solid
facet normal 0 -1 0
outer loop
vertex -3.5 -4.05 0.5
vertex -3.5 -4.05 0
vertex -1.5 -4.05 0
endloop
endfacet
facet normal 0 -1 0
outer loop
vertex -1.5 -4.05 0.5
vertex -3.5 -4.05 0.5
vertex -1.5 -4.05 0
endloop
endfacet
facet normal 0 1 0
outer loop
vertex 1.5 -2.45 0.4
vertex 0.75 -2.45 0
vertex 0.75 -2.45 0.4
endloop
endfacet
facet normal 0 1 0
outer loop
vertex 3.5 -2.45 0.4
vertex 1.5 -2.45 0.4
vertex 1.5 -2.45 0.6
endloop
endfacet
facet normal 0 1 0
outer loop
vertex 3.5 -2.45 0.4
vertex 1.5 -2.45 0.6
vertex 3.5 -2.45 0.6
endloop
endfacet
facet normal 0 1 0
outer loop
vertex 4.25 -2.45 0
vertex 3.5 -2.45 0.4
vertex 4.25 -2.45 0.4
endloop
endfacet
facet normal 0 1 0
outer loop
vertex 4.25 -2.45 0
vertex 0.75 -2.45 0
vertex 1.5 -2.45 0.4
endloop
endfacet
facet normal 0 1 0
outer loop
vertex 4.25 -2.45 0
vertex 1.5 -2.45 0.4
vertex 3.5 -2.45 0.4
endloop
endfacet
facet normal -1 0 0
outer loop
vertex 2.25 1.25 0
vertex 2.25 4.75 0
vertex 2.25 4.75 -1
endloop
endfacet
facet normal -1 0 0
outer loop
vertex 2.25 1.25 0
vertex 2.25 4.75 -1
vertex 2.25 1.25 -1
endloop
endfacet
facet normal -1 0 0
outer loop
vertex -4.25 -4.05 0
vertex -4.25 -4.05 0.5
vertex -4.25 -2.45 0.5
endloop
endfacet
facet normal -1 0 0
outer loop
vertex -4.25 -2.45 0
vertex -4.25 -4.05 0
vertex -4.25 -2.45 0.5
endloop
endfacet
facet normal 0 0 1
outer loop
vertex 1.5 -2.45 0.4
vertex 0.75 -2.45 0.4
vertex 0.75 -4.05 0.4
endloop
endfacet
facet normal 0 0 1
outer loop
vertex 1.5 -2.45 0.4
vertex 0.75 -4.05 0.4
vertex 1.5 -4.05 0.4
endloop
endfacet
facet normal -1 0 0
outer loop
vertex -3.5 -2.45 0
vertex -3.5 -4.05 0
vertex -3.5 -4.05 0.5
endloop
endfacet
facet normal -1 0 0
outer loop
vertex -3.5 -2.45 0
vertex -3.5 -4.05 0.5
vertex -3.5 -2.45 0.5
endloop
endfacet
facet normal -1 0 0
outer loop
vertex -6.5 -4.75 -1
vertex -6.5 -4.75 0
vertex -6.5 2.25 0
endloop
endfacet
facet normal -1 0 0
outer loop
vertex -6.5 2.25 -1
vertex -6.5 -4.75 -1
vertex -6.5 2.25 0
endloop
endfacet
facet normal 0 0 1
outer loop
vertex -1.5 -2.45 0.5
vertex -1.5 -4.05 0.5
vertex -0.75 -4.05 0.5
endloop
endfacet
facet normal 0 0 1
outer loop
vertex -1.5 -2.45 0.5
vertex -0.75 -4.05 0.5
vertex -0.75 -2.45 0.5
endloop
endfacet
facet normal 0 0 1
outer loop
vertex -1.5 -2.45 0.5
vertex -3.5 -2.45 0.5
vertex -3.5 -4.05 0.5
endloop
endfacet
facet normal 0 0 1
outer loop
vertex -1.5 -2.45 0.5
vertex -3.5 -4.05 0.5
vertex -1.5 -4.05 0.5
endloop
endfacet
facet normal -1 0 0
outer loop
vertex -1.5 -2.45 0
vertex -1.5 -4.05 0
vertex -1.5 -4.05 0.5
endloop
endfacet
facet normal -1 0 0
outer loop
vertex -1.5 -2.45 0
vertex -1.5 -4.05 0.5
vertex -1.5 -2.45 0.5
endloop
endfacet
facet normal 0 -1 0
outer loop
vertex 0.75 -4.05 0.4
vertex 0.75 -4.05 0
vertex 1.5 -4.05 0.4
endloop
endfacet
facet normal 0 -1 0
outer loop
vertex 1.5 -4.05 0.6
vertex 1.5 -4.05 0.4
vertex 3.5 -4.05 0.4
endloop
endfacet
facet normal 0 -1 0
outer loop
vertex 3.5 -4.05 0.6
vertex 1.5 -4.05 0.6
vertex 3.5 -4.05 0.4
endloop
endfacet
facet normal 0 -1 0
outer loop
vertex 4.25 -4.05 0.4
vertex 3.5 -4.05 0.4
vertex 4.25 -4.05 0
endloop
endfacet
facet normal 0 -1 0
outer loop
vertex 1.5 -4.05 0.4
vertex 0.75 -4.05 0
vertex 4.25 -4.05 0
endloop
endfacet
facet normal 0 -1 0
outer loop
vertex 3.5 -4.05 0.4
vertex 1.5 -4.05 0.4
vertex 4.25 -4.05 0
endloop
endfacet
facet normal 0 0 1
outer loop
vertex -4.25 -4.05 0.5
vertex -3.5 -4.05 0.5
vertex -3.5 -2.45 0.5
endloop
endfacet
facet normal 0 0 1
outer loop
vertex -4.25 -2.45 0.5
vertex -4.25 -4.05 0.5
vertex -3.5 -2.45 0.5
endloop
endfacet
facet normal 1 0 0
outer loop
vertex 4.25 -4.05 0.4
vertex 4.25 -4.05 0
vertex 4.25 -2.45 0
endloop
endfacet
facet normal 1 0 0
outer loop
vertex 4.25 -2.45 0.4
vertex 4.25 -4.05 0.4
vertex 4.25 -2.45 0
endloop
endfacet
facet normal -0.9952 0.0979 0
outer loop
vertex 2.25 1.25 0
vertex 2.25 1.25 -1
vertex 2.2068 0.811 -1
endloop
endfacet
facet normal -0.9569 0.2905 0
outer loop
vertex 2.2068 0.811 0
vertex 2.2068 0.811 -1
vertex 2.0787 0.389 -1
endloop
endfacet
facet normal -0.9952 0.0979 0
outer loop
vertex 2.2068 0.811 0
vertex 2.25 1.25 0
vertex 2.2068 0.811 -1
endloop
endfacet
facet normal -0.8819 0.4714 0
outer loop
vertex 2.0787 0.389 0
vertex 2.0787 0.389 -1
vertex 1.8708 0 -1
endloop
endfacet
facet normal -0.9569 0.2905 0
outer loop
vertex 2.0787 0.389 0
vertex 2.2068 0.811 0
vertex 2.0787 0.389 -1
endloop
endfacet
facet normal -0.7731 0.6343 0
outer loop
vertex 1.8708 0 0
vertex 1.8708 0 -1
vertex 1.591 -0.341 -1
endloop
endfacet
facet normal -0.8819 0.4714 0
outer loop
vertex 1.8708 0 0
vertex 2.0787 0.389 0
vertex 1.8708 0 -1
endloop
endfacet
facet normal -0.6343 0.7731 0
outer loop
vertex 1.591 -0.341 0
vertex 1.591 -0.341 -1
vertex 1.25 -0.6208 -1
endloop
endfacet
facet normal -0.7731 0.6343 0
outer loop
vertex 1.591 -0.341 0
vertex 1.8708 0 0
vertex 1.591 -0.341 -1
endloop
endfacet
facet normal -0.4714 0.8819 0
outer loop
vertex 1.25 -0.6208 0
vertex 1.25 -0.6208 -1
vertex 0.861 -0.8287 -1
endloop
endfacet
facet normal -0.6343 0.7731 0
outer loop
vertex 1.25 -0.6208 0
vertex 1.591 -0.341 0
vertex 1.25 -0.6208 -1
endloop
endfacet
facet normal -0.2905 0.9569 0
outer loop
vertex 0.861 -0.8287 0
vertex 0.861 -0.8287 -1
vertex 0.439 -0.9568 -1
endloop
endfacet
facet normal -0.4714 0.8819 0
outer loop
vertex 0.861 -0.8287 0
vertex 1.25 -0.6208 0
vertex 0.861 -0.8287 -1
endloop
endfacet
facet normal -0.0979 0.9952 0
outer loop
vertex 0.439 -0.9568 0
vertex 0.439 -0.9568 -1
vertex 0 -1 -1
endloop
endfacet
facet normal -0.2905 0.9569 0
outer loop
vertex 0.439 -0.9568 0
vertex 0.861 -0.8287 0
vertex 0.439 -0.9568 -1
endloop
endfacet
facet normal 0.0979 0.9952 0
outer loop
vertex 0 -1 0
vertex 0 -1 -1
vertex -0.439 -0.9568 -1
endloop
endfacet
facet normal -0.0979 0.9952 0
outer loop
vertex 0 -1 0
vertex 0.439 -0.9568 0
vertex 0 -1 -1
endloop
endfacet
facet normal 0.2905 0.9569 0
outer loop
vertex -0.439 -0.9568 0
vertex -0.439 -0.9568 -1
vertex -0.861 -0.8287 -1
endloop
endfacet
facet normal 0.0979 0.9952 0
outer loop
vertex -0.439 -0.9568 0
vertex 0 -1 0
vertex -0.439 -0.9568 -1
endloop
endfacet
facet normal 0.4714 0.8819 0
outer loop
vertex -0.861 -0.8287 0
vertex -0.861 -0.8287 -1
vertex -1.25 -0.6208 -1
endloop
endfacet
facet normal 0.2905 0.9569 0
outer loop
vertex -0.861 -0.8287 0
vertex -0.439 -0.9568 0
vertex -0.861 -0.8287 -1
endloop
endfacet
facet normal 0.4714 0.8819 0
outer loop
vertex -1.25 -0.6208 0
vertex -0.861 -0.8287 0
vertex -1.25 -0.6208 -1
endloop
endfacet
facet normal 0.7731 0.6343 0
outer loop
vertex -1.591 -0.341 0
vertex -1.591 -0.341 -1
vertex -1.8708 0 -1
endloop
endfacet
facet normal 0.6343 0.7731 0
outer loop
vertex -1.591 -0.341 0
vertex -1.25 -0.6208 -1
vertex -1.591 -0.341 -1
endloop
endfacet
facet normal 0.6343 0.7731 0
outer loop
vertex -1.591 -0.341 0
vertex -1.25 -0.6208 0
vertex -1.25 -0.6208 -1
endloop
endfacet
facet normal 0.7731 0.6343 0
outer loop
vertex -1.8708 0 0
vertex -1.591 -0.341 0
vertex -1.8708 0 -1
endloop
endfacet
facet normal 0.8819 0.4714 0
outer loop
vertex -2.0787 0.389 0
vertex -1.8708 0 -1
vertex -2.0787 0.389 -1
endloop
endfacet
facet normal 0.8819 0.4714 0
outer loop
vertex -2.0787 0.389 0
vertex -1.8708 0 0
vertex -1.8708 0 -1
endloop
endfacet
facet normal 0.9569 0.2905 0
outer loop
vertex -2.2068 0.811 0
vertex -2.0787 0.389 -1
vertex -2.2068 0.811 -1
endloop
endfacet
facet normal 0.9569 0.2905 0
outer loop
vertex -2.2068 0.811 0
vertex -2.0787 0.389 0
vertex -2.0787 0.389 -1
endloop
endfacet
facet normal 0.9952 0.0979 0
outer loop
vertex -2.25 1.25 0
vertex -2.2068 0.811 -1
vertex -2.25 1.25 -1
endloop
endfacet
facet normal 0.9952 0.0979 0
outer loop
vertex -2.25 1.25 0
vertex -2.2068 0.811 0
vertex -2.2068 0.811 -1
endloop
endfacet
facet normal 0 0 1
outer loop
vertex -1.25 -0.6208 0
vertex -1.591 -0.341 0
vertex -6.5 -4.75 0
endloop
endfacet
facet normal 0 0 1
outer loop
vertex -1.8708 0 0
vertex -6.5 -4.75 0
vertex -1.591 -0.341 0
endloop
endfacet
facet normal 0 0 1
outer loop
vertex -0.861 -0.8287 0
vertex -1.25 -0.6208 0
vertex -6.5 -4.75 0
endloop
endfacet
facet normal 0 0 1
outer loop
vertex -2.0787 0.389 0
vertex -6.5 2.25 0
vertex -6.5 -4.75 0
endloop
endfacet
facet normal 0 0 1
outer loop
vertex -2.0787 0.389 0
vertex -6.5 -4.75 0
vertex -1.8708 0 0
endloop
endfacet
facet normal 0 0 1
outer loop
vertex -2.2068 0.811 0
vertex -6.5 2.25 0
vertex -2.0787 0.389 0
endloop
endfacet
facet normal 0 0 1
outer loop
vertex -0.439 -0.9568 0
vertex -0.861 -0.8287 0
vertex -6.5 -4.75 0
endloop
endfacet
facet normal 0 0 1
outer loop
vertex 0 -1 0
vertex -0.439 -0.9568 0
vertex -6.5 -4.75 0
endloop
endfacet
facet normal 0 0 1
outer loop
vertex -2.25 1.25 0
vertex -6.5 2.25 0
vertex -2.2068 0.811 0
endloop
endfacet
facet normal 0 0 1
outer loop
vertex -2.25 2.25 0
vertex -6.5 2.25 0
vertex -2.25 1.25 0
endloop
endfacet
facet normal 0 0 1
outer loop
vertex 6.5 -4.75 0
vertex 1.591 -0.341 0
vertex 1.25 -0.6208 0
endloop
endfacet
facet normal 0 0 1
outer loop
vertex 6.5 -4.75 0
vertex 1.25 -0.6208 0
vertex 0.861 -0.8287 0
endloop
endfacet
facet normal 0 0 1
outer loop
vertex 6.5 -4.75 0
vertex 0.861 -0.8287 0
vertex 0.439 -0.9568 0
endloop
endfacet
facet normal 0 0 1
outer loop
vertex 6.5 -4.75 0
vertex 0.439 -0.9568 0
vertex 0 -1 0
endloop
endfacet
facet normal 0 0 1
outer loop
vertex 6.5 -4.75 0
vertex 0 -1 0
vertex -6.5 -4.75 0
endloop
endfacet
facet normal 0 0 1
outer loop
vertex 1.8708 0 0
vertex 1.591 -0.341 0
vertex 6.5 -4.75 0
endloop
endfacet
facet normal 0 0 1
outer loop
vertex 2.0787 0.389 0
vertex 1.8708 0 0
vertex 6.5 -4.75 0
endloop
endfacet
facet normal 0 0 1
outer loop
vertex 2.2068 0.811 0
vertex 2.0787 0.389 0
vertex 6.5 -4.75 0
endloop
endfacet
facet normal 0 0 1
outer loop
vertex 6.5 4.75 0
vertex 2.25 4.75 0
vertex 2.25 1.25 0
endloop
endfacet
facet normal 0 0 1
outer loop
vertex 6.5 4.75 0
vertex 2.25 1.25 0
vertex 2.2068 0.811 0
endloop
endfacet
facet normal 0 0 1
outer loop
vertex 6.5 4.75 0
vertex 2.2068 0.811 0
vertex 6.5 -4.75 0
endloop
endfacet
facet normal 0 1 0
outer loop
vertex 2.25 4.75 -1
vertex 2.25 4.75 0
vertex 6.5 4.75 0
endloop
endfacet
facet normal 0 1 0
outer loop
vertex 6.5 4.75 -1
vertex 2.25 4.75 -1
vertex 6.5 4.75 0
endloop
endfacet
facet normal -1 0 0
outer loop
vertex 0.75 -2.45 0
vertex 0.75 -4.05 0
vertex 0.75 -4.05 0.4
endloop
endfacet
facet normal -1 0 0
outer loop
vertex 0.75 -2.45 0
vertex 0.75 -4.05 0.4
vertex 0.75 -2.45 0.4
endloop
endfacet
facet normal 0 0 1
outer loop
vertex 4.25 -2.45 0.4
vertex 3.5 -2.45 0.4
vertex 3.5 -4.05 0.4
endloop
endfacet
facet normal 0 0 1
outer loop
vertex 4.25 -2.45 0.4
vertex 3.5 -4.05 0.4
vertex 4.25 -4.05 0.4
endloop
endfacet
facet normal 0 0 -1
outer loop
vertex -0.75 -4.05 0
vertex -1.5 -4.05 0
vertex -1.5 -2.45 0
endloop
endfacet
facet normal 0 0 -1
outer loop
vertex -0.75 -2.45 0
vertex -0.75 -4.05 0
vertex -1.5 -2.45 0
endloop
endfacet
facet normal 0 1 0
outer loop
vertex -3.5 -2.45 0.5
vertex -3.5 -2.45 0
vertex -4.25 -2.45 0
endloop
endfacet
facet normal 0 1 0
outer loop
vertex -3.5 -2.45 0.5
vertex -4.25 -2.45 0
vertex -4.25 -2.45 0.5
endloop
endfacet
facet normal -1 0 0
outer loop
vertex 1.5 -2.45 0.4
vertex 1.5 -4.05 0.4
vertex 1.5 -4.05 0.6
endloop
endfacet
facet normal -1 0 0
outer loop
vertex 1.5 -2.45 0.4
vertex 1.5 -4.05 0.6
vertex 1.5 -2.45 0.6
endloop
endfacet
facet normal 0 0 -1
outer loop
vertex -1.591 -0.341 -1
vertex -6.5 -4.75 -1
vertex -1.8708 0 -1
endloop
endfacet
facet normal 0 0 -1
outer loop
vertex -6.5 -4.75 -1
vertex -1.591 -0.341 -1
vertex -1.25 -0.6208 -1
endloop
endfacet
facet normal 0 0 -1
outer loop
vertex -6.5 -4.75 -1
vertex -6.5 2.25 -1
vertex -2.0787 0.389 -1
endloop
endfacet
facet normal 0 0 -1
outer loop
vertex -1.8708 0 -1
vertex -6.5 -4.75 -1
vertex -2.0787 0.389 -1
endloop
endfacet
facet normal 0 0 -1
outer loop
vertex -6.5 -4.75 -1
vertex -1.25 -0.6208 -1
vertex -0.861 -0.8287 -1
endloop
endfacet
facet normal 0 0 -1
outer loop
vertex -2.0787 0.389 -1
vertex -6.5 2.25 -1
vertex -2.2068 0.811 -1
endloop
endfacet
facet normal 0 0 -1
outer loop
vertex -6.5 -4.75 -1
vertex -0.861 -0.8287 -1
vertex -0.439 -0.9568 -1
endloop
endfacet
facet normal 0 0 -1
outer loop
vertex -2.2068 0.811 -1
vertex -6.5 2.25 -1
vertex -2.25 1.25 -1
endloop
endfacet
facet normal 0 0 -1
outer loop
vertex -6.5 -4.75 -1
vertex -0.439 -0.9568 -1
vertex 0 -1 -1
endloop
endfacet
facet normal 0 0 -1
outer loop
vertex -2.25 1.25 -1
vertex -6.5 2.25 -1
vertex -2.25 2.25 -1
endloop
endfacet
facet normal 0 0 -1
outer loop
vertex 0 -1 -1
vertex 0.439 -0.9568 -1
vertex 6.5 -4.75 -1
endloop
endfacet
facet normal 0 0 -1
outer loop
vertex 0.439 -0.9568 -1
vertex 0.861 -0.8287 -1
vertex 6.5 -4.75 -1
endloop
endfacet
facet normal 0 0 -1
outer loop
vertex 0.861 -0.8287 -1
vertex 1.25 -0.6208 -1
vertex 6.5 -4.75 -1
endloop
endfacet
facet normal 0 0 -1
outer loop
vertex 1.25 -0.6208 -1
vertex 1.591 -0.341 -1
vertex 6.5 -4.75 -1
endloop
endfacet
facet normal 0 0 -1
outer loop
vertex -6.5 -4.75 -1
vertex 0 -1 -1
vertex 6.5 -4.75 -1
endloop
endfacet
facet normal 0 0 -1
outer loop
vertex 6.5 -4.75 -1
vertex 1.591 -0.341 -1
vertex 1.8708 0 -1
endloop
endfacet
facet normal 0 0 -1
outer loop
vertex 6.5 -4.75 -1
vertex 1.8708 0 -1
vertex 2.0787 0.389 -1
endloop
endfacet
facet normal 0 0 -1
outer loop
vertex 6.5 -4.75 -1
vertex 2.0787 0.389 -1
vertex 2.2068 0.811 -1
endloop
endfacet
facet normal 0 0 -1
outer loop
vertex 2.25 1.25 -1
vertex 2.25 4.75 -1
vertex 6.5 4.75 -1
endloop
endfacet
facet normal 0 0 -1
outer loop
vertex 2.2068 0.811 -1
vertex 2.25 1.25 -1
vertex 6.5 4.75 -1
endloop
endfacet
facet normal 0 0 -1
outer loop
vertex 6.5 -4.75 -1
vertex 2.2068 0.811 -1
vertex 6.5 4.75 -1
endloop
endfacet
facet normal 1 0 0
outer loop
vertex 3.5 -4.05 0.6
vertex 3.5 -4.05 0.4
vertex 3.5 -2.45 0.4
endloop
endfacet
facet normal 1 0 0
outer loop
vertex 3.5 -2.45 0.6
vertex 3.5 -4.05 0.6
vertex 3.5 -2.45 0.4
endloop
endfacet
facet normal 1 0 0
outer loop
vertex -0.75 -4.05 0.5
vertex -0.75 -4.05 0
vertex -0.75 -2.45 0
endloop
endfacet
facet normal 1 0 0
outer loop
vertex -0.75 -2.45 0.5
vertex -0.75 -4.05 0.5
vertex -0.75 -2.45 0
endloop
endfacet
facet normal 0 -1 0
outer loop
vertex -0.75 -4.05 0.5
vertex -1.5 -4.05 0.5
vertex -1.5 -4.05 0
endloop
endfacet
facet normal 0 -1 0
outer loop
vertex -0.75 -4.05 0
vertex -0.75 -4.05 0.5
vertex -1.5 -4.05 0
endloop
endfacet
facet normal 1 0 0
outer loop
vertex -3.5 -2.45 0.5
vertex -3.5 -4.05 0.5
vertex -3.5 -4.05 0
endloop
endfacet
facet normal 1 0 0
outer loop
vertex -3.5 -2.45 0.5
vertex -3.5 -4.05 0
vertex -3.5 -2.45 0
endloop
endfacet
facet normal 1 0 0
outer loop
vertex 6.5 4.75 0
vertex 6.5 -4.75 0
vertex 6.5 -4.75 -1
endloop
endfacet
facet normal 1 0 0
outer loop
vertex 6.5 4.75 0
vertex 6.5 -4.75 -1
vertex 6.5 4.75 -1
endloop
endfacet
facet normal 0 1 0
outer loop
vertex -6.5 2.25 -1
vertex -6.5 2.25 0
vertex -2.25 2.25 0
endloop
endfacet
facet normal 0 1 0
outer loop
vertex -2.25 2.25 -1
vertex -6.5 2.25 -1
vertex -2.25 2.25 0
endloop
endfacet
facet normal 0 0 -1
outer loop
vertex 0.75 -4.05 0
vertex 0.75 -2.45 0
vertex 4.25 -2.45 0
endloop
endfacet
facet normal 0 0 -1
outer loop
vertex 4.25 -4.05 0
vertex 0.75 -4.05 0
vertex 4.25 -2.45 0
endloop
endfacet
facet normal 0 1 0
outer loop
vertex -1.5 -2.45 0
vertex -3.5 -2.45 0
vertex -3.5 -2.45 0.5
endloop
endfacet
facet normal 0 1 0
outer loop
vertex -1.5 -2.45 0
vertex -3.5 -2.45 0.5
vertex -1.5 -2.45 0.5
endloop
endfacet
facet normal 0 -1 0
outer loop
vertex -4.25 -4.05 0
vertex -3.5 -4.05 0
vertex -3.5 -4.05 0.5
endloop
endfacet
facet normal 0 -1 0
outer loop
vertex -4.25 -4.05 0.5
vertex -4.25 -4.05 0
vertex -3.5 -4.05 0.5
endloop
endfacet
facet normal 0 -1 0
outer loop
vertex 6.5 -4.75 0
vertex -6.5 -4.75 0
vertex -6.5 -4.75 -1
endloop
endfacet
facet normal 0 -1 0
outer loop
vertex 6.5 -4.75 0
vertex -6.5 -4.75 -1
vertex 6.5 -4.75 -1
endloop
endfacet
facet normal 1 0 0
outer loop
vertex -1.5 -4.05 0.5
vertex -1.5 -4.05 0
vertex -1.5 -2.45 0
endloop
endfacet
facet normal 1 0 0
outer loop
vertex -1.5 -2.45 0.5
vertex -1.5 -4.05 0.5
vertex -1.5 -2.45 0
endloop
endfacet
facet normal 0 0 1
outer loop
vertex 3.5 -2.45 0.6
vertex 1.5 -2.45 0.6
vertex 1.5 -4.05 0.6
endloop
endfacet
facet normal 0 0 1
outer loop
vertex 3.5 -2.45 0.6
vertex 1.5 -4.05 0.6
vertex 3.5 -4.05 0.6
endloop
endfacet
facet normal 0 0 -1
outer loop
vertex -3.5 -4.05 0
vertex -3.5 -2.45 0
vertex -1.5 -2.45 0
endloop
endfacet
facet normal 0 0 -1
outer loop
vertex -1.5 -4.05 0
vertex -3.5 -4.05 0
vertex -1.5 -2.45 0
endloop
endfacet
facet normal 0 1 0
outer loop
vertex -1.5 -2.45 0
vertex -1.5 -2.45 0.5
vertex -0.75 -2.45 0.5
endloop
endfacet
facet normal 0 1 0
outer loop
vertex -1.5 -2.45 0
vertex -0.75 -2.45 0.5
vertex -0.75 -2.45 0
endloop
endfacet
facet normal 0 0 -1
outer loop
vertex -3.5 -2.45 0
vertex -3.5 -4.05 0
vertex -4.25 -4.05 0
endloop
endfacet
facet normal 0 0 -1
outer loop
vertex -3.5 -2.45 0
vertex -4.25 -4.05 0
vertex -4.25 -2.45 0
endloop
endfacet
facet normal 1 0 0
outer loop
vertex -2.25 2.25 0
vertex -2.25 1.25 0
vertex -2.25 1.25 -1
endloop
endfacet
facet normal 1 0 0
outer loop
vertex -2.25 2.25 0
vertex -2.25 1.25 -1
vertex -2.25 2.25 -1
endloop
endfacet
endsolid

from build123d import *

# Parameters (mm, degrees)
BASES_W                           = 13
BASES_H                           = 9.5
BASE_DEPTH                        = 1
FASTENER_ACCESS_DEPTH             = 9.11249037
SMDCAPACITORBODYS_W               = 2
SMDCAPACITORBODYS_H               = 1.6
SMD_CAPACITOR_BODY_DEPTH          = 0.5
SMDCAPACITORSOLDERBODY1S_W        = 1.6
SMDCAPACITORSOLDERBODY1S_H        = 0.5
SMD_CAPACITOR_SOLDER_BODY_1_DEPTH = 0.75
SMDCAPACITORSOLDERBODY2S_W        = 1.6
SMDCAPACITORSOLDERBODY2S_H        = 0.5
SMD_CAPACITOR_SOLDER_BODY_2_DEPTH = 0.75
LEDS_W                            = 3.5
LEDS_H                            = 1.6
LED_DEPTH                         = 0.4
LEDTS_W                           = 2
LEDTS_H                           = 1.6
LED_TOP_DEPTH                     = 0.2
SKETCH1_W                         = 4.25
SKETCH1_H                         = 2.5
PCB_LEFT_CUT_DEPTH                = 9.11249037


with BuildPart() as part:
    # BaseS → BASE (new body)
    with BuildSketch(Plane.XY):
        Rectangle(BASES_W, BASES_H)
    extrude(amount=-BASE_DEPTH)

    # FastenerAccessS → FASTENER ACCESS (cut, through all)
    with BuildSketch(Plane.XY):
        with BuildLine():
            Line((-2.25, 4.75), (2.25, 4.75))
            Line((2.25, 4.75), (2.25, 1.25))
            ThreePointArc((2.25, 1.25), (0, -1), (-2.25, 1.25))
            Line((-2.25, 1.25), (-2.25, 4.75))
        make_face()
    extrude(amount=-FASTENER_ACCESS_DEPTH, mode=Mode.SUBTRACT)

    # Sketch1 → PCB Left Cut (cut, through all)
    with BuildSketch(Plane.XY):
        with Locations((-4.375, 3.5)):
            Rectangle(SKETCH1_W, SKETCH1_H)
    extrude(amount=-PCB_LEFT_CUT_DEPTH, mode=Mode.SUBTRACT)


with BuildPart() as body_2:
    # SMDCapacitorBodyS → SMD CAPACITOR BODY (new body)
    with BuildSketch(Plane.XY):
        with Locations((-2.5, -3.25)):
            Rectangle(SMDCAPACITORBODYS_W, SMDCAPACITORBODYS_H)
    extrude(amount=SMD_CAPACITOR_BODY_DEPTH)


with BuildPart() as body_3:
    # SMDCapacitorSolderBody1S → SMD CAPACITOR SOLDER BODY 1 (new body)
    with BuildSketch(Plane(origin=(-3.5, -0.45, 0), x_dir=(0, 1, 0), z_dir=(1, 0, 0))):
        with Locations((-2.8, 0.25)):
            Rectangle(SMDCAPACITORSOLDERBODY1S_W, SMDCAPACITORSOLDERBODY1S_H)
    extrude(amount=-SMD_CAPACITOR_SOLDER_BODY_1_DEPTH)


with BuildPart() as body_4:
    # SMDCapacitorSolderBody2S → SMD CAPACITOR SOLDER BODY 2 (new body)
    with BuildSketch(Plane(origin=(-1.5, -1.05, 0), x_dir=(0, 1, 0), z_dir=(-1, 0, 0))):
        with Locations((-2.2, -0.25)):
            Rectangle(SMDCAPACITORSOLDERBODY2S_W, SMDCAPACITORSOLDERBODY2S_H)
    extrude(amount=-SMD_CAPACITOR_SOLDER_BODY_2_DEPTH)


with BuildPart() as body_5:
    # LEDS → LED (new body)
    with BuildSketch(Plane.XY):
        with Locations((2.5, -3.25)):
            Rectangle(LEDS_W, LEDS_H)
    extrude(amount=LED_DEPTH)

    # LEDTS → LED TOP (add)
    with BuildSketch(Plane.XY.offset(0.4)):
        with Locations((2.5, -3.25)):
            Rectangle(LEDTS_W, LEDTS_H)
    extrude(amount=LED_TOP_DEPTH)


solid = Compound([part.part, body_2.part, body_3.part, body_4.part, body_5.part])
